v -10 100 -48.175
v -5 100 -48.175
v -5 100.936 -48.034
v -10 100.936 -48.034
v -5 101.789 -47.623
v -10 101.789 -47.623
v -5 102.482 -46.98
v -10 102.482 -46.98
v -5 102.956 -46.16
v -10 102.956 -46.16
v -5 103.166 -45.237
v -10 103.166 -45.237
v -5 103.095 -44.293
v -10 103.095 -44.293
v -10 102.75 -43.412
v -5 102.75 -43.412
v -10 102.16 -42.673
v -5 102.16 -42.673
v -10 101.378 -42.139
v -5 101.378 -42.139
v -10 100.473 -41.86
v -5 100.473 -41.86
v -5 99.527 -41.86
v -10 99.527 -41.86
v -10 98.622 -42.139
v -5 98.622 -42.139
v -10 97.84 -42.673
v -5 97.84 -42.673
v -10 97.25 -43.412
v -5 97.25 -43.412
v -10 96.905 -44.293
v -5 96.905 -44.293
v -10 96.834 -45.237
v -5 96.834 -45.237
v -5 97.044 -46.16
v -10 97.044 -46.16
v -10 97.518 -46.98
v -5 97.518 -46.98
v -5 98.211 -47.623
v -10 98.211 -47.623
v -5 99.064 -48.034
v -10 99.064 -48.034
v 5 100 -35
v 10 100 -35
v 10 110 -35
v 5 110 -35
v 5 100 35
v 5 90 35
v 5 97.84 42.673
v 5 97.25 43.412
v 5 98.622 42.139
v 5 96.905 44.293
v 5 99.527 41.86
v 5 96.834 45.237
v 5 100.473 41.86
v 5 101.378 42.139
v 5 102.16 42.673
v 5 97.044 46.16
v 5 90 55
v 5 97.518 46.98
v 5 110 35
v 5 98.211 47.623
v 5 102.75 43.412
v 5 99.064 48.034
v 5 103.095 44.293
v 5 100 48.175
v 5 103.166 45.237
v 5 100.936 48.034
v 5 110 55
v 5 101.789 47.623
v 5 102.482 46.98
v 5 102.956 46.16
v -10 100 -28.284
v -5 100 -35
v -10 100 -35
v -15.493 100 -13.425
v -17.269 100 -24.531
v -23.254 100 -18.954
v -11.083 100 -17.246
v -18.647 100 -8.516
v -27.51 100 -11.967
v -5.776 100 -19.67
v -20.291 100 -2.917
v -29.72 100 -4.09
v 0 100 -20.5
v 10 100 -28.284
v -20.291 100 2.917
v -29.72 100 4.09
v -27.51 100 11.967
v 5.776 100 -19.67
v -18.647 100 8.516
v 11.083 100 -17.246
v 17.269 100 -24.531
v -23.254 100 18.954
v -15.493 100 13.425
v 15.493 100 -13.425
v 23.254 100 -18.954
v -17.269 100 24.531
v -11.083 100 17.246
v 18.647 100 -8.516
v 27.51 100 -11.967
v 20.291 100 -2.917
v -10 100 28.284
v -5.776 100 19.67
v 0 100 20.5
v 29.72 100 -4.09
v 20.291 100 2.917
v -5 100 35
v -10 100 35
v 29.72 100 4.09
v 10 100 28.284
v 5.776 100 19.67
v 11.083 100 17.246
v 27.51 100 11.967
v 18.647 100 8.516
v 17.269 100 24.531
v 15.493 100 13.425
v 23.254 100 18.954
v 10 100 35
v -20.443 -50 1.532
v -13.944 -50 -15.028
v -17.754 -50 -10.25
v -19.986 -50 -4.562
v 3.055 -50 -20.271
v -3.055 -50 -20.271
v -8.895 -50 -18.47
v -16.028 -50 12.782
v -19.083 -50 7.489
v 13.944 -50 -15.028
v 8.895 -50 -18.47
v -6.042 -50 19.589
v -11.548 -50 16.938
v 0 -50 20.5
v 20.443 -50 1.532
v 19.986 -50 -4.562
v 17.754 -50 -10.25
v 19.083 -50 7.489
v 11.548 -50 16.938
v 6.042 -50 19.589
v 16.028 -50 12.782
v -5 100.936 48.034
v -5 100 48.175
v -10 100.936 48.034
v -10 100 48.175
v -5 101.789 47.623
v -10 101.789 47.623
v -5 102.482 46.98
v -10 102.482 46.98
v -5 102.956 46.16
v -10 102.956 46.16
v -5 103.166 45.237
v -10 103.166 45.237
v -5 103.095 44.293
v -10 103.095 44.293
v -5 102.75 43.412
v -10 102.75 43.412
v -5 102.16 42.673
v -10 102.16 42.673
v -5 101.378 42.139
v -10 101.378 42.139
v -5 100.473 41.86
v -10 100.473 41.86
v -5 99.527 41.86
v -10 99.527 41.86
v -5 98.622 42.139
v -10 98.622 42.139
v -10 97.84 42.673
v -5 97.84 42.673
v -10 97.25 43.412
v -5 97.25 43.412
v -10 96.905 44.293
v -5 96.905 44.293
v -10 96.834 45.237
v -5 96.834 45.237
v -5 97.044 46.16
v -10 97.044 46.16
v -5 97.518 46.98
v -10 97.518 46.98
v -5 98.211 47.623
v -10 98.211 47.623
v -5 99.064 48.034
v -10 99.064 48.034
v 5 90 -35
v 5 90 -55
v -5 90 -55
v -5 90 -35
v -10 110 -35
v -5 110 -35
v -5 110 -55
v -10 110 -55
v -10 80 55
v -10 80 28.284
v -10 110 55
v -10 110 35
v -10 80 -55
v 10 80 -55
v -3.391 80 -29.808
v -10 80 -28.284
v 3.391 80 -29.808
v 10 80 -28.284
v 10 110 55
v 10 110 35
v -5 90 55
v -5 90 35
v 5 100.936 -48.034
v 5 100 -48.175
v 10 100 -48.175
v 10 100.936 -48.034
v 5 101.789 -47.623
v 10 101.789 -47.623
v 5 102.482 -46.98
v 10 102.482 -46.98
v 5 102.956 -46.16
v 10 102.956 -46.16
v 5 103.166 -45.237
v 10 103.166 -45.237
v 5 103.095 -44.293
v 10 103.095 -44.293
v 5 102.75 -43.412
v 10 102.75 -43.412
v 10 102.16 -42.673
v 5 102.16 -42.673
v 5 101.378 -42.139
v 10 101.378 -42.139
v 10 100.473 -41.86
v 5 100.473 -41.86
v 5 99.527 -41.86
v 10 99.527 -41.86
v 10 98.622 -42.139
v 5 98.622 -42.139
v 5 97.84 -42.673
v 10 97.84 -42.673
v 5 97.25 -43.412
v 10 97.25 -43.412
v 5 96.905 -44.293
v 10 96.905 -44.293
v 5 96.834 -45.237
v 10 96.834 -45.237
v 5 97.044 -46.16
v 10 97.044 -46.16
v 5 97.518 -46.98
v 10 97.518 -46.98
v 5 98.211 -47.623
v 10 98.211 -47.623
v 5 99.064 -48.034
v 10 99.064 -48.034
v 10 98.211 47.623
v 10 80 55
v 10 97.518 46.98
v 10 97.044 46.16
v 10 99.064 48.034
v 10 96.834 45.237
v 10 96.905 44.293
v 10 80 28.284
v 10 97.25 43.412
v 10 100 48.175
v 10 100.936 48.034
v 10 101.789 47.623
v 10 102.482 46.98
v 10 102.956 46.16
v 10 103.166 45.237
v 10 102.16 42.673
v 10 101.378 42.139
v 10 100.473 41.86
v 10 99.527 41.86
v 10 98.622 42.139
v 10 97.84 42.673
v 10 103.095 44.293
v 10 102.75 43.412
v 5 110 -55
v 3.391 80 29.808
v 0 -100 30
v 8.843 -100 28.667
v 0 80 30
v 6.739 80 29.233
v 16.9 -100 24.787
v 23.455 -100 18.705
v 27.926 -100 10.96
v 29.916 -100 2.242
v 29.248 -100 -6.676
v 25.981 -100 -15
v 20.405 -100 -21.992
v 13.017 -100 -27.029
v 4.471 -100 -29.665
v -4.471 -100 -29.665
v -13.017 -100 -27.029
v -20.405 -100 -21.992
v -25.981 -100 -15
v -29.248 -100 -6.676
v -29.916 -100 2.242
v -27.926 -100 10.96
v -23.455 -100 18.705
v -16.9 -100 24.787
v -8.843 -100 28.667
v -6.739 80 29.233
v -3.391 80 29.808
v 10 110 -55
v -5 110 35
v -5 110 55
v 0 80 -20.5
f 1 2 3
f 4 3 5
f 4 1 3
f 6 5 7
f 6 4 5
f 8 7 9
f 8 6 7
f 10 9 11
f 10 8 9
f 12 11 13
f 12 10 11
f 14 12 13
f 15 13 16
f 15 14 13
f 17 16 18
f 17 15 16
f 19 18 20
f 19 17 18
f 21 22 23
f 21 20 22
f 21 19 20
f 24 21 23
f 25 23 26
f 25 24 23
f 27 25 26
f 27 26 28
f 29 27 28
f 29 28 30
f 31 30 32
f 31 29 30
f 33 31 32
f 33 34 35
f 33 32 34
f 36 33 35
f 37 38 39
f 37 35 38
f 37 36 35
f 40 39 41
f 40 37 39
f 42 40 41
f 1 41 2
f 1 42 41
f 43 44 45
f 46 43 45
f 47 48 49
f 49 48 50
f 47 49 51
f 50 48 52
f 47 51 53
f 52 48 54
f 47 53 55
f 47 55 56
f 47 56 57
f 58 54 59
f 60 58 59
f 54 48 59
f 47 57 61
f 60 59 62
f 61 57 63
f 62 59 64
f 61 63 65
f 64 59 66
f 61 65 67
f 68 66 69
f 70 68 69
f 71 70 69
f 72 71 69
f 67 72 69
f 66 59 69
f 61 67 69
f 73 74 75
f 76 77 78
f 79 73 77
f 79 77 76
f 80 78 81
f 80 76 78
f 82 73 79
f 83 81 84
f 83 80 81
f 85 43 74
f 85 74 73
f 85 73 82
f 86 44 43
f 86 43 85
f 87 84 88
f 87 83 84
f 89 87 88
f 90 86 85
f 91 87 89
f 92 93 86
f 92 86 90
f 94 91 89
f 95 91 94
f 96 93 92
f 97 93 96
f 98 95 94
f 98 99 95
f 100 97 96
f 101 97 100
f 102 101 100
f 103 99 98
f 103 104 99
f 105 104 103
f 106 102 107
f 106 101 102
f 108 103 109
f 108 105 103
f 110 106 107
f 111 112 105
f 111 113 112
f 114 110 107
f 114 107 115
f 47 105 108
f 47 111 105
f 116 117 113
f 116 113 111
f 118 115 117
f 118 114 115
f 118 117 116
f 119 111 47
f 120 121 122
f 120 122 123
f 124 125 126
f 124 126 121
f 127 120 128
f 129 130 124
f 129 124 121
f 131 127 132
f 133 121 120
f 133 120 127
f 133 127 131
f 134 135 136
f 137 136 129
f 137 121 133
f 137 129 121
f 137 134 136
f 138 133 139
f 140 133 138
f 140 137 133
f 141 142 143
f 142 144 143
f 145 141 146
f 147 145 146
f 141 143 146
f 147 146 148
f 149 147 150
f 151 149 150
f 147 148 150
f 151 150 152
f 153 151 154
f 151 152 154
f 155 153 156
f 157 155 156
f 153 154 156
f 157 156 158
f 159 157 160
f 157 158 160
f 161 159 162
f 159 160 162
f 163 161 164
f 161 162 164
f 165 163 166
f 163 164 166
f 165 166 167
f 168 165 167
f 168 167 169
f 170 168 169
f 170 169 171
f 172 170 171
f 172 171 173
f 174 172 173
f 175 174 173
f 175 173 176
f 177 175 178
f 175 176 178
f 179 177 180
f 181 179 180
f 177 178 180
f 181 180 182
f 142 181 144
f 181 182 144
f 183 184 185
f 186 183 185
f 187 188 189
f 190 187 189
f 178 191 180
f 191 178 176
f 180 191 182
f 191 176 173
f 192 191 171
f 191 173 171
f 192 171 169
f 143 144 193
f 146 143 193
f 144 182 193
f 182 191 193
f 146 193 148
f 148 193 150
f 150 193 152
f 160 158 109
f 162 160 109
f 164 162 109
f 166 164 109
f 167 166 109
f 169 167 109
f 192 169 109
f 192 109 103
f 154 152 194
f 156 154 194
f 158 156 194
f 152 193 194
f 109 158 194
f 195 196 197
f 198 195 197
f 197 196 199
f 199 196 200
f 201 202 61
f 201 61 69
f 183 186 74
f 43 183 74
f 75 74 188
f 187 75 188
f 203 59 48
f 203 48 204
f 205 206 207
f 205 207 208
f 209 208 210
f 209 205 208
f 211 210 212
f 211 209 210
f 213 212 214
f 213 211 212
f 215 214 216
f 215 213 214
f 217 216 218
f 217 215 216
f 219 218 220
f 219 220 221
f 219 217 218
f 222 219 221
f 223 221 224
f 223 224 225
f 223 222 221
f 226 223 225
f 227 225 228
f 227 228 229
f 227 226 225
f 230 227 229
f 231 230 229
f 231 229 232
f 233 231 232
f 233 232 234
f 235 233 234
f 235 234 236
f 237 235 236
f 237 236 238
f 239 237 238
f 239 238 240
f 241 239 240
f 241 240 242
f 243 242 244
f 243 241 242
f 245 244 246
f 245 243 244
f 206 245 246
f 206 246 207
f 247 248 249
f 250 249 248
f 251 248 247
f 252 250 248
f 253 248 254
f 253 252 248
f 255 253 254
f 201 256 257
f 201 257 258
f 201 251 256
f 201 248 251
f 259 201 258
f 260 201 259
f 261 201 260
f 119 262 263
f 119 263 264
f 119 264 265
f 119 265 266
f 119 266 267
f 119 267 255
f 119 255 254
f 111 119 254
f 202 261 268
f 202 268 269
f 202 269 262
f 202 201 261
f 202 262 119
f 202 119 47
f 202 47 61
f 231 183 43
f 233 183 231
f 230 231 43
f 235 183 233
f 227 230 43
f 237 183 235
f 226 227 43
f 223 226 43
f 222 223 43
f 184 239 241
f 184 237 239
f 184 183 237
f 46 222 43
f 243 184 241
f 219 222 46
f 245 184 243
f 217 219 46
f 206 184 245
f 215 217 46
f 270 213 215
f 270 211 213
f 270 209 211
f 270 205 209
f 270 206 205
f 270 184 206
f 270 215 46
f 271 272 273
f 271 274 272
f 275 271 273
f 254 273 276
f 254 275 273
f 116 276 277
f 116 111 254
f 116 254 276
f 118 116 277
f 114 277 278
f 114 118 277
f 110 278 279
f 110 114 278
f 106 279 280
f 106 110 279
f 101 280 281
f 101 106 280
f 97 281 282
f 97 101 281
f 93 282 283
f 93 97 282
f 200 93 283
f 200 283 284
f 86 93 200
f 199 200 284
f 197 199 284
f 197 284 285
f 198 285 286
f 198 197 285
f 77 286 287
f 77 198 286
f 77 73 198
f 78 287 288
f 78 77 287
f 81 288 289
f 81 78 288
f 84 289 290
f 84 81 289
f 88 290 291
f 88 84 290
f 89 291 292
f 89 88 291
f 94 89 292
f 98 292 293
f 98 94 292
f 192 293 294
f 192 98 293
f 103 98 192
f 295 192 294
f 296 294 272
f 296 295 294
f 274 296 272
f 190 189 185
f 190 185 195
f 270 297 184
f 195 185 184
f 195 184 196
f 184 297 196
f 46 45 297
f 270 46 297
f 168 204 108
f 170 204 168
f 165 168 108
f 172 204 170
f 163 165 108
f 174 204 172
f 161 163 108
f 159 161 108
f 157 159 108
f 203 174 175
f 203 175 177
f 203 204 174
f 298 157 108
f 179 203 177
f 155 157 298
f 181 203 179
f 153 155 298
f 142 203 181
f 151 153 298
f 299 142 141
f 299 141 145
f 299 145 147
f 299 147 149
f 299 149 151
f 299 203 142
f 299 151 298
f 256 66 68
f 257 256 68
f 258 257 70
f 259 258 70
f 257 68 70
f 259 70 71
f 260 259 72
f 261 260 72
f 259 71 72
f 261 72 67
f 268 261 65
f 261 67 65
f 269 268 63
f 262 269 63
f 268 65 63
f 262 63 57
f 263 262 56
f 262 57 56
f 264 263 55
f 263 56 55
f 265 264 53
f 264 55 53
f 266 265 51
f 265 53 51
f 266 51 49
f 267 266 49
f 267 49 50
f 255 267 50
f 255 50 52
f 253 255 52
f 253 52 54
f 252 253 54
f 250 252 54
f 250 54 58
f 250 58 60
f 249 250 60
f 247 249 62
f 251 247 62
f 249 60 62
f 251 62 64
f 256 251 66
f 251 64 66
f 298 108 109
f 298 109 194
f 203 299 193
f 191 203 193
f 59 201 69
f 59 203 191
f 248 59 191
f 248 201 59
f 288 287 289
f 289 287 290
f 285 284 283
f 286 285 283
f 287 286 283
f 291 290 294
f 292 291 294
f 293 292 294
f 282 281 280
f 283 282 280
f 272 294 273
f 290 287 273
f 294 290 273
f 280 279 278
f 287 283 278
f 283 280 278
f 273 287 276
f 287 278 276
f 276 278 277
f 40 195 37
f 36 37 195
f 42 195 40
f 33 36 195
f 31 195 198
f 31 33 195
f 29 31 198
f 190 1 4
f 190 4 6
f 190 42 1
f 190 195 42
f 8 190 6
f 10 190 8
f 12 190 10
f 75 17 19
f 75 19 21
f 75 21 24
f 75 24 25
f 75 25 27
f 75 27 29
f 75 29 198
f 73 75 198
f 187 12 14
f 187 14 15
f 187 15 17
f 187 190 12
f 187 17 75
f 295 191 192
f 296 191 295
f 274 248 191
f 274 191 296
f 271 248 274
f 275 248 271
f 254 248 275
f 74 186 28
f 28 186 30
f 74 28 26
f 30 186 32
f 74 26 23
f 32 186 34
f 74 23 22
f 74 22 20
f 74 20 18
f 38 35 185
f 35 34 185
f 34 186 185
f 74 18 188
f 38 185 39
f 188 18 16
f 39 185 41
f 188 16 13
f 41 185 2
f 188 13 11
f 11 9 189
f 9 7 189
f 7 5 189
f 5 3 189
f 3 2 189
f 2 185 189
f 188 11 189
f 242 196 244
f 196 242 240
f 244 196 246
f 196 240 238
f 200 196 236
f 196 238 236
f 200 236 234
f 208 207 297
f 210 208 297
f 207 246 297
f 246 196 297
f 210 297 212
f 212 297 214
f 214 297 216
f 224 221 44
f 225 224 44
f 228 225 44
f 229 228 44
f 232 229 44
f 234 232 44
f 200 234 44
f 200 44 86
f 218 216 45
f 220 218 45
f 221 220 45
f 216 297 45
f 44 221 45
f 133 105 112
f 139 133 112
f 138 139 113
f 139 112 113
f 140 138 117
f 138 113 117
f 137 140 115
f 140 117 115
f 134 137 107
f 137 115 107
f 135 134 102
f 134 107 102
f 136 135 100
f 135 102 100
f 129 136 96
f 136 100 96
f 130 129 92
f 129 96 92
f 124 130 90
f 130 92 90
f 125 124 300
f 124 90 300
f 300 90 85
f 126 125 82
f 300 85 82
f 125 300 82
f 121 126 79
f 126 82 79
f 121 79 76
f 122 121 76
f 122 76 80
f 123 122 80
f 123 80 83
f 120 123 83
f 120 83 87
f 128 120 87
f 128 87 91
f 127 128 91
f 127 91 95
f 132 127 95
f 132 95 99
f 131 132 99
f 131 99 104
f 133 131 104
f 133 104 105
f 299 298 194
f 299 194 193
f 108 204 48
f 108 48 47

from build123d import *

# Parameters (mm, degrees)
SKETCH1_R           = 30
BOSS_EXTRUDE1_DEPTH = 100
SKETCH2_R           = 20.5
CUT_EXTRUDE1_DEPTH  = 150
SKETCH3_R           = 3.175
BOSS_EXTRUDE3_DEPTH = 10
CUT_EXTRUDE2_REACH  = 144.215
SKETCH4_W           = 10
SKETCH4_H           = 20


with BuildPart() as part:
    # Sketch1 → Boss-Extrude1 (new, symmetric)
    with BuildSketch(Plane(origin=(0, 0, 0), x_dir=(1, 0, 0), z_dir=(0, 1, 0))):
        with Locations(Location((0, 0, 0), (0, 0, 270))):
            Circle(SKETCH1_R)
    extrude(amount=BOSS_EXTRUDE1_DEPTH, both=True)

    # Sketch2 → Cut-Extrude1 (cut)
    with BuildSketch(Plane(origin=(0, 100, 0), x_dir=(1, 0, 0), z_dir=(0, 1, 0))):
        with Locations(Location((0, 0, 0), (0, 0, 270))):
            Circle(SKETCH2_R)
    extrude(amount=-CUT_EXTRUDE1_DEPTH, mode=Mode.SUBTRACT)

    # Sketch3 → Boss-Extrude3 (add, symmetric)
    with BuildSketch(Plane(origin=(0, 0, 0), x_dir=(0, 0, -1), z_dir=(1, 0, 0))):
        Polygon((20.5, 100), (35, 100), (35, 110), (55, 110), (55, 80), (20.5, 80), align=None)
        with Locations((45, 100)):
            Circle(SKETCH3_R, mode=Mode.SUBTRACT)
    boss_extrude3 = extrude(amount=BOSS_EXTRUDE3_DEPTH, both=True)

    # Cut-Extrude2: up to this face of the body (flat: up to its plane)
    cut_extrude2_end = Plane(part.part.faces().sort_by_distance((0, 105, -35))[0])
    # Sketch4 → Cut-Extrude2 (cut, up to the picked face)
    with BuildSketch(Plane(origin=(0, 0, -55), x_dir=(-1, 0, 0), z_dir=(0, 0, -1)), mode=Mode.PRIVATE) as cut_extrude2_sk1:
        with Locations((0, 100)):
            Rectangle(SKETCH4_W, SKETCH4_H)
    cut_extrude2_tool1 = split(extrude(cut_extrude2_sk1.sketch, amount=-CUT_EXTRUDE2_REACH, mode=Mode.PRIVATE), bisect_by=cut_extrude2_end, keep=Keep.BOTH, mode=Mode.PRIVATE)
    cut_extrude2 = cut_extrude2_tool1.solids().sort_by(Axis((0, 100, -55), (0, 0, 1)))[0]
    add(cut_extrude2, mode=Mode.SUBTRACT)

    # Mirror1: Boss-Extrude3, Cut-Extrude2 across plane
    add(boss_extrude3.mirror(Plane.XY))
    add(cut_extrude2.mirror(Plane.XY), mode=Mode.SUBTRACT)


solid = part.part
